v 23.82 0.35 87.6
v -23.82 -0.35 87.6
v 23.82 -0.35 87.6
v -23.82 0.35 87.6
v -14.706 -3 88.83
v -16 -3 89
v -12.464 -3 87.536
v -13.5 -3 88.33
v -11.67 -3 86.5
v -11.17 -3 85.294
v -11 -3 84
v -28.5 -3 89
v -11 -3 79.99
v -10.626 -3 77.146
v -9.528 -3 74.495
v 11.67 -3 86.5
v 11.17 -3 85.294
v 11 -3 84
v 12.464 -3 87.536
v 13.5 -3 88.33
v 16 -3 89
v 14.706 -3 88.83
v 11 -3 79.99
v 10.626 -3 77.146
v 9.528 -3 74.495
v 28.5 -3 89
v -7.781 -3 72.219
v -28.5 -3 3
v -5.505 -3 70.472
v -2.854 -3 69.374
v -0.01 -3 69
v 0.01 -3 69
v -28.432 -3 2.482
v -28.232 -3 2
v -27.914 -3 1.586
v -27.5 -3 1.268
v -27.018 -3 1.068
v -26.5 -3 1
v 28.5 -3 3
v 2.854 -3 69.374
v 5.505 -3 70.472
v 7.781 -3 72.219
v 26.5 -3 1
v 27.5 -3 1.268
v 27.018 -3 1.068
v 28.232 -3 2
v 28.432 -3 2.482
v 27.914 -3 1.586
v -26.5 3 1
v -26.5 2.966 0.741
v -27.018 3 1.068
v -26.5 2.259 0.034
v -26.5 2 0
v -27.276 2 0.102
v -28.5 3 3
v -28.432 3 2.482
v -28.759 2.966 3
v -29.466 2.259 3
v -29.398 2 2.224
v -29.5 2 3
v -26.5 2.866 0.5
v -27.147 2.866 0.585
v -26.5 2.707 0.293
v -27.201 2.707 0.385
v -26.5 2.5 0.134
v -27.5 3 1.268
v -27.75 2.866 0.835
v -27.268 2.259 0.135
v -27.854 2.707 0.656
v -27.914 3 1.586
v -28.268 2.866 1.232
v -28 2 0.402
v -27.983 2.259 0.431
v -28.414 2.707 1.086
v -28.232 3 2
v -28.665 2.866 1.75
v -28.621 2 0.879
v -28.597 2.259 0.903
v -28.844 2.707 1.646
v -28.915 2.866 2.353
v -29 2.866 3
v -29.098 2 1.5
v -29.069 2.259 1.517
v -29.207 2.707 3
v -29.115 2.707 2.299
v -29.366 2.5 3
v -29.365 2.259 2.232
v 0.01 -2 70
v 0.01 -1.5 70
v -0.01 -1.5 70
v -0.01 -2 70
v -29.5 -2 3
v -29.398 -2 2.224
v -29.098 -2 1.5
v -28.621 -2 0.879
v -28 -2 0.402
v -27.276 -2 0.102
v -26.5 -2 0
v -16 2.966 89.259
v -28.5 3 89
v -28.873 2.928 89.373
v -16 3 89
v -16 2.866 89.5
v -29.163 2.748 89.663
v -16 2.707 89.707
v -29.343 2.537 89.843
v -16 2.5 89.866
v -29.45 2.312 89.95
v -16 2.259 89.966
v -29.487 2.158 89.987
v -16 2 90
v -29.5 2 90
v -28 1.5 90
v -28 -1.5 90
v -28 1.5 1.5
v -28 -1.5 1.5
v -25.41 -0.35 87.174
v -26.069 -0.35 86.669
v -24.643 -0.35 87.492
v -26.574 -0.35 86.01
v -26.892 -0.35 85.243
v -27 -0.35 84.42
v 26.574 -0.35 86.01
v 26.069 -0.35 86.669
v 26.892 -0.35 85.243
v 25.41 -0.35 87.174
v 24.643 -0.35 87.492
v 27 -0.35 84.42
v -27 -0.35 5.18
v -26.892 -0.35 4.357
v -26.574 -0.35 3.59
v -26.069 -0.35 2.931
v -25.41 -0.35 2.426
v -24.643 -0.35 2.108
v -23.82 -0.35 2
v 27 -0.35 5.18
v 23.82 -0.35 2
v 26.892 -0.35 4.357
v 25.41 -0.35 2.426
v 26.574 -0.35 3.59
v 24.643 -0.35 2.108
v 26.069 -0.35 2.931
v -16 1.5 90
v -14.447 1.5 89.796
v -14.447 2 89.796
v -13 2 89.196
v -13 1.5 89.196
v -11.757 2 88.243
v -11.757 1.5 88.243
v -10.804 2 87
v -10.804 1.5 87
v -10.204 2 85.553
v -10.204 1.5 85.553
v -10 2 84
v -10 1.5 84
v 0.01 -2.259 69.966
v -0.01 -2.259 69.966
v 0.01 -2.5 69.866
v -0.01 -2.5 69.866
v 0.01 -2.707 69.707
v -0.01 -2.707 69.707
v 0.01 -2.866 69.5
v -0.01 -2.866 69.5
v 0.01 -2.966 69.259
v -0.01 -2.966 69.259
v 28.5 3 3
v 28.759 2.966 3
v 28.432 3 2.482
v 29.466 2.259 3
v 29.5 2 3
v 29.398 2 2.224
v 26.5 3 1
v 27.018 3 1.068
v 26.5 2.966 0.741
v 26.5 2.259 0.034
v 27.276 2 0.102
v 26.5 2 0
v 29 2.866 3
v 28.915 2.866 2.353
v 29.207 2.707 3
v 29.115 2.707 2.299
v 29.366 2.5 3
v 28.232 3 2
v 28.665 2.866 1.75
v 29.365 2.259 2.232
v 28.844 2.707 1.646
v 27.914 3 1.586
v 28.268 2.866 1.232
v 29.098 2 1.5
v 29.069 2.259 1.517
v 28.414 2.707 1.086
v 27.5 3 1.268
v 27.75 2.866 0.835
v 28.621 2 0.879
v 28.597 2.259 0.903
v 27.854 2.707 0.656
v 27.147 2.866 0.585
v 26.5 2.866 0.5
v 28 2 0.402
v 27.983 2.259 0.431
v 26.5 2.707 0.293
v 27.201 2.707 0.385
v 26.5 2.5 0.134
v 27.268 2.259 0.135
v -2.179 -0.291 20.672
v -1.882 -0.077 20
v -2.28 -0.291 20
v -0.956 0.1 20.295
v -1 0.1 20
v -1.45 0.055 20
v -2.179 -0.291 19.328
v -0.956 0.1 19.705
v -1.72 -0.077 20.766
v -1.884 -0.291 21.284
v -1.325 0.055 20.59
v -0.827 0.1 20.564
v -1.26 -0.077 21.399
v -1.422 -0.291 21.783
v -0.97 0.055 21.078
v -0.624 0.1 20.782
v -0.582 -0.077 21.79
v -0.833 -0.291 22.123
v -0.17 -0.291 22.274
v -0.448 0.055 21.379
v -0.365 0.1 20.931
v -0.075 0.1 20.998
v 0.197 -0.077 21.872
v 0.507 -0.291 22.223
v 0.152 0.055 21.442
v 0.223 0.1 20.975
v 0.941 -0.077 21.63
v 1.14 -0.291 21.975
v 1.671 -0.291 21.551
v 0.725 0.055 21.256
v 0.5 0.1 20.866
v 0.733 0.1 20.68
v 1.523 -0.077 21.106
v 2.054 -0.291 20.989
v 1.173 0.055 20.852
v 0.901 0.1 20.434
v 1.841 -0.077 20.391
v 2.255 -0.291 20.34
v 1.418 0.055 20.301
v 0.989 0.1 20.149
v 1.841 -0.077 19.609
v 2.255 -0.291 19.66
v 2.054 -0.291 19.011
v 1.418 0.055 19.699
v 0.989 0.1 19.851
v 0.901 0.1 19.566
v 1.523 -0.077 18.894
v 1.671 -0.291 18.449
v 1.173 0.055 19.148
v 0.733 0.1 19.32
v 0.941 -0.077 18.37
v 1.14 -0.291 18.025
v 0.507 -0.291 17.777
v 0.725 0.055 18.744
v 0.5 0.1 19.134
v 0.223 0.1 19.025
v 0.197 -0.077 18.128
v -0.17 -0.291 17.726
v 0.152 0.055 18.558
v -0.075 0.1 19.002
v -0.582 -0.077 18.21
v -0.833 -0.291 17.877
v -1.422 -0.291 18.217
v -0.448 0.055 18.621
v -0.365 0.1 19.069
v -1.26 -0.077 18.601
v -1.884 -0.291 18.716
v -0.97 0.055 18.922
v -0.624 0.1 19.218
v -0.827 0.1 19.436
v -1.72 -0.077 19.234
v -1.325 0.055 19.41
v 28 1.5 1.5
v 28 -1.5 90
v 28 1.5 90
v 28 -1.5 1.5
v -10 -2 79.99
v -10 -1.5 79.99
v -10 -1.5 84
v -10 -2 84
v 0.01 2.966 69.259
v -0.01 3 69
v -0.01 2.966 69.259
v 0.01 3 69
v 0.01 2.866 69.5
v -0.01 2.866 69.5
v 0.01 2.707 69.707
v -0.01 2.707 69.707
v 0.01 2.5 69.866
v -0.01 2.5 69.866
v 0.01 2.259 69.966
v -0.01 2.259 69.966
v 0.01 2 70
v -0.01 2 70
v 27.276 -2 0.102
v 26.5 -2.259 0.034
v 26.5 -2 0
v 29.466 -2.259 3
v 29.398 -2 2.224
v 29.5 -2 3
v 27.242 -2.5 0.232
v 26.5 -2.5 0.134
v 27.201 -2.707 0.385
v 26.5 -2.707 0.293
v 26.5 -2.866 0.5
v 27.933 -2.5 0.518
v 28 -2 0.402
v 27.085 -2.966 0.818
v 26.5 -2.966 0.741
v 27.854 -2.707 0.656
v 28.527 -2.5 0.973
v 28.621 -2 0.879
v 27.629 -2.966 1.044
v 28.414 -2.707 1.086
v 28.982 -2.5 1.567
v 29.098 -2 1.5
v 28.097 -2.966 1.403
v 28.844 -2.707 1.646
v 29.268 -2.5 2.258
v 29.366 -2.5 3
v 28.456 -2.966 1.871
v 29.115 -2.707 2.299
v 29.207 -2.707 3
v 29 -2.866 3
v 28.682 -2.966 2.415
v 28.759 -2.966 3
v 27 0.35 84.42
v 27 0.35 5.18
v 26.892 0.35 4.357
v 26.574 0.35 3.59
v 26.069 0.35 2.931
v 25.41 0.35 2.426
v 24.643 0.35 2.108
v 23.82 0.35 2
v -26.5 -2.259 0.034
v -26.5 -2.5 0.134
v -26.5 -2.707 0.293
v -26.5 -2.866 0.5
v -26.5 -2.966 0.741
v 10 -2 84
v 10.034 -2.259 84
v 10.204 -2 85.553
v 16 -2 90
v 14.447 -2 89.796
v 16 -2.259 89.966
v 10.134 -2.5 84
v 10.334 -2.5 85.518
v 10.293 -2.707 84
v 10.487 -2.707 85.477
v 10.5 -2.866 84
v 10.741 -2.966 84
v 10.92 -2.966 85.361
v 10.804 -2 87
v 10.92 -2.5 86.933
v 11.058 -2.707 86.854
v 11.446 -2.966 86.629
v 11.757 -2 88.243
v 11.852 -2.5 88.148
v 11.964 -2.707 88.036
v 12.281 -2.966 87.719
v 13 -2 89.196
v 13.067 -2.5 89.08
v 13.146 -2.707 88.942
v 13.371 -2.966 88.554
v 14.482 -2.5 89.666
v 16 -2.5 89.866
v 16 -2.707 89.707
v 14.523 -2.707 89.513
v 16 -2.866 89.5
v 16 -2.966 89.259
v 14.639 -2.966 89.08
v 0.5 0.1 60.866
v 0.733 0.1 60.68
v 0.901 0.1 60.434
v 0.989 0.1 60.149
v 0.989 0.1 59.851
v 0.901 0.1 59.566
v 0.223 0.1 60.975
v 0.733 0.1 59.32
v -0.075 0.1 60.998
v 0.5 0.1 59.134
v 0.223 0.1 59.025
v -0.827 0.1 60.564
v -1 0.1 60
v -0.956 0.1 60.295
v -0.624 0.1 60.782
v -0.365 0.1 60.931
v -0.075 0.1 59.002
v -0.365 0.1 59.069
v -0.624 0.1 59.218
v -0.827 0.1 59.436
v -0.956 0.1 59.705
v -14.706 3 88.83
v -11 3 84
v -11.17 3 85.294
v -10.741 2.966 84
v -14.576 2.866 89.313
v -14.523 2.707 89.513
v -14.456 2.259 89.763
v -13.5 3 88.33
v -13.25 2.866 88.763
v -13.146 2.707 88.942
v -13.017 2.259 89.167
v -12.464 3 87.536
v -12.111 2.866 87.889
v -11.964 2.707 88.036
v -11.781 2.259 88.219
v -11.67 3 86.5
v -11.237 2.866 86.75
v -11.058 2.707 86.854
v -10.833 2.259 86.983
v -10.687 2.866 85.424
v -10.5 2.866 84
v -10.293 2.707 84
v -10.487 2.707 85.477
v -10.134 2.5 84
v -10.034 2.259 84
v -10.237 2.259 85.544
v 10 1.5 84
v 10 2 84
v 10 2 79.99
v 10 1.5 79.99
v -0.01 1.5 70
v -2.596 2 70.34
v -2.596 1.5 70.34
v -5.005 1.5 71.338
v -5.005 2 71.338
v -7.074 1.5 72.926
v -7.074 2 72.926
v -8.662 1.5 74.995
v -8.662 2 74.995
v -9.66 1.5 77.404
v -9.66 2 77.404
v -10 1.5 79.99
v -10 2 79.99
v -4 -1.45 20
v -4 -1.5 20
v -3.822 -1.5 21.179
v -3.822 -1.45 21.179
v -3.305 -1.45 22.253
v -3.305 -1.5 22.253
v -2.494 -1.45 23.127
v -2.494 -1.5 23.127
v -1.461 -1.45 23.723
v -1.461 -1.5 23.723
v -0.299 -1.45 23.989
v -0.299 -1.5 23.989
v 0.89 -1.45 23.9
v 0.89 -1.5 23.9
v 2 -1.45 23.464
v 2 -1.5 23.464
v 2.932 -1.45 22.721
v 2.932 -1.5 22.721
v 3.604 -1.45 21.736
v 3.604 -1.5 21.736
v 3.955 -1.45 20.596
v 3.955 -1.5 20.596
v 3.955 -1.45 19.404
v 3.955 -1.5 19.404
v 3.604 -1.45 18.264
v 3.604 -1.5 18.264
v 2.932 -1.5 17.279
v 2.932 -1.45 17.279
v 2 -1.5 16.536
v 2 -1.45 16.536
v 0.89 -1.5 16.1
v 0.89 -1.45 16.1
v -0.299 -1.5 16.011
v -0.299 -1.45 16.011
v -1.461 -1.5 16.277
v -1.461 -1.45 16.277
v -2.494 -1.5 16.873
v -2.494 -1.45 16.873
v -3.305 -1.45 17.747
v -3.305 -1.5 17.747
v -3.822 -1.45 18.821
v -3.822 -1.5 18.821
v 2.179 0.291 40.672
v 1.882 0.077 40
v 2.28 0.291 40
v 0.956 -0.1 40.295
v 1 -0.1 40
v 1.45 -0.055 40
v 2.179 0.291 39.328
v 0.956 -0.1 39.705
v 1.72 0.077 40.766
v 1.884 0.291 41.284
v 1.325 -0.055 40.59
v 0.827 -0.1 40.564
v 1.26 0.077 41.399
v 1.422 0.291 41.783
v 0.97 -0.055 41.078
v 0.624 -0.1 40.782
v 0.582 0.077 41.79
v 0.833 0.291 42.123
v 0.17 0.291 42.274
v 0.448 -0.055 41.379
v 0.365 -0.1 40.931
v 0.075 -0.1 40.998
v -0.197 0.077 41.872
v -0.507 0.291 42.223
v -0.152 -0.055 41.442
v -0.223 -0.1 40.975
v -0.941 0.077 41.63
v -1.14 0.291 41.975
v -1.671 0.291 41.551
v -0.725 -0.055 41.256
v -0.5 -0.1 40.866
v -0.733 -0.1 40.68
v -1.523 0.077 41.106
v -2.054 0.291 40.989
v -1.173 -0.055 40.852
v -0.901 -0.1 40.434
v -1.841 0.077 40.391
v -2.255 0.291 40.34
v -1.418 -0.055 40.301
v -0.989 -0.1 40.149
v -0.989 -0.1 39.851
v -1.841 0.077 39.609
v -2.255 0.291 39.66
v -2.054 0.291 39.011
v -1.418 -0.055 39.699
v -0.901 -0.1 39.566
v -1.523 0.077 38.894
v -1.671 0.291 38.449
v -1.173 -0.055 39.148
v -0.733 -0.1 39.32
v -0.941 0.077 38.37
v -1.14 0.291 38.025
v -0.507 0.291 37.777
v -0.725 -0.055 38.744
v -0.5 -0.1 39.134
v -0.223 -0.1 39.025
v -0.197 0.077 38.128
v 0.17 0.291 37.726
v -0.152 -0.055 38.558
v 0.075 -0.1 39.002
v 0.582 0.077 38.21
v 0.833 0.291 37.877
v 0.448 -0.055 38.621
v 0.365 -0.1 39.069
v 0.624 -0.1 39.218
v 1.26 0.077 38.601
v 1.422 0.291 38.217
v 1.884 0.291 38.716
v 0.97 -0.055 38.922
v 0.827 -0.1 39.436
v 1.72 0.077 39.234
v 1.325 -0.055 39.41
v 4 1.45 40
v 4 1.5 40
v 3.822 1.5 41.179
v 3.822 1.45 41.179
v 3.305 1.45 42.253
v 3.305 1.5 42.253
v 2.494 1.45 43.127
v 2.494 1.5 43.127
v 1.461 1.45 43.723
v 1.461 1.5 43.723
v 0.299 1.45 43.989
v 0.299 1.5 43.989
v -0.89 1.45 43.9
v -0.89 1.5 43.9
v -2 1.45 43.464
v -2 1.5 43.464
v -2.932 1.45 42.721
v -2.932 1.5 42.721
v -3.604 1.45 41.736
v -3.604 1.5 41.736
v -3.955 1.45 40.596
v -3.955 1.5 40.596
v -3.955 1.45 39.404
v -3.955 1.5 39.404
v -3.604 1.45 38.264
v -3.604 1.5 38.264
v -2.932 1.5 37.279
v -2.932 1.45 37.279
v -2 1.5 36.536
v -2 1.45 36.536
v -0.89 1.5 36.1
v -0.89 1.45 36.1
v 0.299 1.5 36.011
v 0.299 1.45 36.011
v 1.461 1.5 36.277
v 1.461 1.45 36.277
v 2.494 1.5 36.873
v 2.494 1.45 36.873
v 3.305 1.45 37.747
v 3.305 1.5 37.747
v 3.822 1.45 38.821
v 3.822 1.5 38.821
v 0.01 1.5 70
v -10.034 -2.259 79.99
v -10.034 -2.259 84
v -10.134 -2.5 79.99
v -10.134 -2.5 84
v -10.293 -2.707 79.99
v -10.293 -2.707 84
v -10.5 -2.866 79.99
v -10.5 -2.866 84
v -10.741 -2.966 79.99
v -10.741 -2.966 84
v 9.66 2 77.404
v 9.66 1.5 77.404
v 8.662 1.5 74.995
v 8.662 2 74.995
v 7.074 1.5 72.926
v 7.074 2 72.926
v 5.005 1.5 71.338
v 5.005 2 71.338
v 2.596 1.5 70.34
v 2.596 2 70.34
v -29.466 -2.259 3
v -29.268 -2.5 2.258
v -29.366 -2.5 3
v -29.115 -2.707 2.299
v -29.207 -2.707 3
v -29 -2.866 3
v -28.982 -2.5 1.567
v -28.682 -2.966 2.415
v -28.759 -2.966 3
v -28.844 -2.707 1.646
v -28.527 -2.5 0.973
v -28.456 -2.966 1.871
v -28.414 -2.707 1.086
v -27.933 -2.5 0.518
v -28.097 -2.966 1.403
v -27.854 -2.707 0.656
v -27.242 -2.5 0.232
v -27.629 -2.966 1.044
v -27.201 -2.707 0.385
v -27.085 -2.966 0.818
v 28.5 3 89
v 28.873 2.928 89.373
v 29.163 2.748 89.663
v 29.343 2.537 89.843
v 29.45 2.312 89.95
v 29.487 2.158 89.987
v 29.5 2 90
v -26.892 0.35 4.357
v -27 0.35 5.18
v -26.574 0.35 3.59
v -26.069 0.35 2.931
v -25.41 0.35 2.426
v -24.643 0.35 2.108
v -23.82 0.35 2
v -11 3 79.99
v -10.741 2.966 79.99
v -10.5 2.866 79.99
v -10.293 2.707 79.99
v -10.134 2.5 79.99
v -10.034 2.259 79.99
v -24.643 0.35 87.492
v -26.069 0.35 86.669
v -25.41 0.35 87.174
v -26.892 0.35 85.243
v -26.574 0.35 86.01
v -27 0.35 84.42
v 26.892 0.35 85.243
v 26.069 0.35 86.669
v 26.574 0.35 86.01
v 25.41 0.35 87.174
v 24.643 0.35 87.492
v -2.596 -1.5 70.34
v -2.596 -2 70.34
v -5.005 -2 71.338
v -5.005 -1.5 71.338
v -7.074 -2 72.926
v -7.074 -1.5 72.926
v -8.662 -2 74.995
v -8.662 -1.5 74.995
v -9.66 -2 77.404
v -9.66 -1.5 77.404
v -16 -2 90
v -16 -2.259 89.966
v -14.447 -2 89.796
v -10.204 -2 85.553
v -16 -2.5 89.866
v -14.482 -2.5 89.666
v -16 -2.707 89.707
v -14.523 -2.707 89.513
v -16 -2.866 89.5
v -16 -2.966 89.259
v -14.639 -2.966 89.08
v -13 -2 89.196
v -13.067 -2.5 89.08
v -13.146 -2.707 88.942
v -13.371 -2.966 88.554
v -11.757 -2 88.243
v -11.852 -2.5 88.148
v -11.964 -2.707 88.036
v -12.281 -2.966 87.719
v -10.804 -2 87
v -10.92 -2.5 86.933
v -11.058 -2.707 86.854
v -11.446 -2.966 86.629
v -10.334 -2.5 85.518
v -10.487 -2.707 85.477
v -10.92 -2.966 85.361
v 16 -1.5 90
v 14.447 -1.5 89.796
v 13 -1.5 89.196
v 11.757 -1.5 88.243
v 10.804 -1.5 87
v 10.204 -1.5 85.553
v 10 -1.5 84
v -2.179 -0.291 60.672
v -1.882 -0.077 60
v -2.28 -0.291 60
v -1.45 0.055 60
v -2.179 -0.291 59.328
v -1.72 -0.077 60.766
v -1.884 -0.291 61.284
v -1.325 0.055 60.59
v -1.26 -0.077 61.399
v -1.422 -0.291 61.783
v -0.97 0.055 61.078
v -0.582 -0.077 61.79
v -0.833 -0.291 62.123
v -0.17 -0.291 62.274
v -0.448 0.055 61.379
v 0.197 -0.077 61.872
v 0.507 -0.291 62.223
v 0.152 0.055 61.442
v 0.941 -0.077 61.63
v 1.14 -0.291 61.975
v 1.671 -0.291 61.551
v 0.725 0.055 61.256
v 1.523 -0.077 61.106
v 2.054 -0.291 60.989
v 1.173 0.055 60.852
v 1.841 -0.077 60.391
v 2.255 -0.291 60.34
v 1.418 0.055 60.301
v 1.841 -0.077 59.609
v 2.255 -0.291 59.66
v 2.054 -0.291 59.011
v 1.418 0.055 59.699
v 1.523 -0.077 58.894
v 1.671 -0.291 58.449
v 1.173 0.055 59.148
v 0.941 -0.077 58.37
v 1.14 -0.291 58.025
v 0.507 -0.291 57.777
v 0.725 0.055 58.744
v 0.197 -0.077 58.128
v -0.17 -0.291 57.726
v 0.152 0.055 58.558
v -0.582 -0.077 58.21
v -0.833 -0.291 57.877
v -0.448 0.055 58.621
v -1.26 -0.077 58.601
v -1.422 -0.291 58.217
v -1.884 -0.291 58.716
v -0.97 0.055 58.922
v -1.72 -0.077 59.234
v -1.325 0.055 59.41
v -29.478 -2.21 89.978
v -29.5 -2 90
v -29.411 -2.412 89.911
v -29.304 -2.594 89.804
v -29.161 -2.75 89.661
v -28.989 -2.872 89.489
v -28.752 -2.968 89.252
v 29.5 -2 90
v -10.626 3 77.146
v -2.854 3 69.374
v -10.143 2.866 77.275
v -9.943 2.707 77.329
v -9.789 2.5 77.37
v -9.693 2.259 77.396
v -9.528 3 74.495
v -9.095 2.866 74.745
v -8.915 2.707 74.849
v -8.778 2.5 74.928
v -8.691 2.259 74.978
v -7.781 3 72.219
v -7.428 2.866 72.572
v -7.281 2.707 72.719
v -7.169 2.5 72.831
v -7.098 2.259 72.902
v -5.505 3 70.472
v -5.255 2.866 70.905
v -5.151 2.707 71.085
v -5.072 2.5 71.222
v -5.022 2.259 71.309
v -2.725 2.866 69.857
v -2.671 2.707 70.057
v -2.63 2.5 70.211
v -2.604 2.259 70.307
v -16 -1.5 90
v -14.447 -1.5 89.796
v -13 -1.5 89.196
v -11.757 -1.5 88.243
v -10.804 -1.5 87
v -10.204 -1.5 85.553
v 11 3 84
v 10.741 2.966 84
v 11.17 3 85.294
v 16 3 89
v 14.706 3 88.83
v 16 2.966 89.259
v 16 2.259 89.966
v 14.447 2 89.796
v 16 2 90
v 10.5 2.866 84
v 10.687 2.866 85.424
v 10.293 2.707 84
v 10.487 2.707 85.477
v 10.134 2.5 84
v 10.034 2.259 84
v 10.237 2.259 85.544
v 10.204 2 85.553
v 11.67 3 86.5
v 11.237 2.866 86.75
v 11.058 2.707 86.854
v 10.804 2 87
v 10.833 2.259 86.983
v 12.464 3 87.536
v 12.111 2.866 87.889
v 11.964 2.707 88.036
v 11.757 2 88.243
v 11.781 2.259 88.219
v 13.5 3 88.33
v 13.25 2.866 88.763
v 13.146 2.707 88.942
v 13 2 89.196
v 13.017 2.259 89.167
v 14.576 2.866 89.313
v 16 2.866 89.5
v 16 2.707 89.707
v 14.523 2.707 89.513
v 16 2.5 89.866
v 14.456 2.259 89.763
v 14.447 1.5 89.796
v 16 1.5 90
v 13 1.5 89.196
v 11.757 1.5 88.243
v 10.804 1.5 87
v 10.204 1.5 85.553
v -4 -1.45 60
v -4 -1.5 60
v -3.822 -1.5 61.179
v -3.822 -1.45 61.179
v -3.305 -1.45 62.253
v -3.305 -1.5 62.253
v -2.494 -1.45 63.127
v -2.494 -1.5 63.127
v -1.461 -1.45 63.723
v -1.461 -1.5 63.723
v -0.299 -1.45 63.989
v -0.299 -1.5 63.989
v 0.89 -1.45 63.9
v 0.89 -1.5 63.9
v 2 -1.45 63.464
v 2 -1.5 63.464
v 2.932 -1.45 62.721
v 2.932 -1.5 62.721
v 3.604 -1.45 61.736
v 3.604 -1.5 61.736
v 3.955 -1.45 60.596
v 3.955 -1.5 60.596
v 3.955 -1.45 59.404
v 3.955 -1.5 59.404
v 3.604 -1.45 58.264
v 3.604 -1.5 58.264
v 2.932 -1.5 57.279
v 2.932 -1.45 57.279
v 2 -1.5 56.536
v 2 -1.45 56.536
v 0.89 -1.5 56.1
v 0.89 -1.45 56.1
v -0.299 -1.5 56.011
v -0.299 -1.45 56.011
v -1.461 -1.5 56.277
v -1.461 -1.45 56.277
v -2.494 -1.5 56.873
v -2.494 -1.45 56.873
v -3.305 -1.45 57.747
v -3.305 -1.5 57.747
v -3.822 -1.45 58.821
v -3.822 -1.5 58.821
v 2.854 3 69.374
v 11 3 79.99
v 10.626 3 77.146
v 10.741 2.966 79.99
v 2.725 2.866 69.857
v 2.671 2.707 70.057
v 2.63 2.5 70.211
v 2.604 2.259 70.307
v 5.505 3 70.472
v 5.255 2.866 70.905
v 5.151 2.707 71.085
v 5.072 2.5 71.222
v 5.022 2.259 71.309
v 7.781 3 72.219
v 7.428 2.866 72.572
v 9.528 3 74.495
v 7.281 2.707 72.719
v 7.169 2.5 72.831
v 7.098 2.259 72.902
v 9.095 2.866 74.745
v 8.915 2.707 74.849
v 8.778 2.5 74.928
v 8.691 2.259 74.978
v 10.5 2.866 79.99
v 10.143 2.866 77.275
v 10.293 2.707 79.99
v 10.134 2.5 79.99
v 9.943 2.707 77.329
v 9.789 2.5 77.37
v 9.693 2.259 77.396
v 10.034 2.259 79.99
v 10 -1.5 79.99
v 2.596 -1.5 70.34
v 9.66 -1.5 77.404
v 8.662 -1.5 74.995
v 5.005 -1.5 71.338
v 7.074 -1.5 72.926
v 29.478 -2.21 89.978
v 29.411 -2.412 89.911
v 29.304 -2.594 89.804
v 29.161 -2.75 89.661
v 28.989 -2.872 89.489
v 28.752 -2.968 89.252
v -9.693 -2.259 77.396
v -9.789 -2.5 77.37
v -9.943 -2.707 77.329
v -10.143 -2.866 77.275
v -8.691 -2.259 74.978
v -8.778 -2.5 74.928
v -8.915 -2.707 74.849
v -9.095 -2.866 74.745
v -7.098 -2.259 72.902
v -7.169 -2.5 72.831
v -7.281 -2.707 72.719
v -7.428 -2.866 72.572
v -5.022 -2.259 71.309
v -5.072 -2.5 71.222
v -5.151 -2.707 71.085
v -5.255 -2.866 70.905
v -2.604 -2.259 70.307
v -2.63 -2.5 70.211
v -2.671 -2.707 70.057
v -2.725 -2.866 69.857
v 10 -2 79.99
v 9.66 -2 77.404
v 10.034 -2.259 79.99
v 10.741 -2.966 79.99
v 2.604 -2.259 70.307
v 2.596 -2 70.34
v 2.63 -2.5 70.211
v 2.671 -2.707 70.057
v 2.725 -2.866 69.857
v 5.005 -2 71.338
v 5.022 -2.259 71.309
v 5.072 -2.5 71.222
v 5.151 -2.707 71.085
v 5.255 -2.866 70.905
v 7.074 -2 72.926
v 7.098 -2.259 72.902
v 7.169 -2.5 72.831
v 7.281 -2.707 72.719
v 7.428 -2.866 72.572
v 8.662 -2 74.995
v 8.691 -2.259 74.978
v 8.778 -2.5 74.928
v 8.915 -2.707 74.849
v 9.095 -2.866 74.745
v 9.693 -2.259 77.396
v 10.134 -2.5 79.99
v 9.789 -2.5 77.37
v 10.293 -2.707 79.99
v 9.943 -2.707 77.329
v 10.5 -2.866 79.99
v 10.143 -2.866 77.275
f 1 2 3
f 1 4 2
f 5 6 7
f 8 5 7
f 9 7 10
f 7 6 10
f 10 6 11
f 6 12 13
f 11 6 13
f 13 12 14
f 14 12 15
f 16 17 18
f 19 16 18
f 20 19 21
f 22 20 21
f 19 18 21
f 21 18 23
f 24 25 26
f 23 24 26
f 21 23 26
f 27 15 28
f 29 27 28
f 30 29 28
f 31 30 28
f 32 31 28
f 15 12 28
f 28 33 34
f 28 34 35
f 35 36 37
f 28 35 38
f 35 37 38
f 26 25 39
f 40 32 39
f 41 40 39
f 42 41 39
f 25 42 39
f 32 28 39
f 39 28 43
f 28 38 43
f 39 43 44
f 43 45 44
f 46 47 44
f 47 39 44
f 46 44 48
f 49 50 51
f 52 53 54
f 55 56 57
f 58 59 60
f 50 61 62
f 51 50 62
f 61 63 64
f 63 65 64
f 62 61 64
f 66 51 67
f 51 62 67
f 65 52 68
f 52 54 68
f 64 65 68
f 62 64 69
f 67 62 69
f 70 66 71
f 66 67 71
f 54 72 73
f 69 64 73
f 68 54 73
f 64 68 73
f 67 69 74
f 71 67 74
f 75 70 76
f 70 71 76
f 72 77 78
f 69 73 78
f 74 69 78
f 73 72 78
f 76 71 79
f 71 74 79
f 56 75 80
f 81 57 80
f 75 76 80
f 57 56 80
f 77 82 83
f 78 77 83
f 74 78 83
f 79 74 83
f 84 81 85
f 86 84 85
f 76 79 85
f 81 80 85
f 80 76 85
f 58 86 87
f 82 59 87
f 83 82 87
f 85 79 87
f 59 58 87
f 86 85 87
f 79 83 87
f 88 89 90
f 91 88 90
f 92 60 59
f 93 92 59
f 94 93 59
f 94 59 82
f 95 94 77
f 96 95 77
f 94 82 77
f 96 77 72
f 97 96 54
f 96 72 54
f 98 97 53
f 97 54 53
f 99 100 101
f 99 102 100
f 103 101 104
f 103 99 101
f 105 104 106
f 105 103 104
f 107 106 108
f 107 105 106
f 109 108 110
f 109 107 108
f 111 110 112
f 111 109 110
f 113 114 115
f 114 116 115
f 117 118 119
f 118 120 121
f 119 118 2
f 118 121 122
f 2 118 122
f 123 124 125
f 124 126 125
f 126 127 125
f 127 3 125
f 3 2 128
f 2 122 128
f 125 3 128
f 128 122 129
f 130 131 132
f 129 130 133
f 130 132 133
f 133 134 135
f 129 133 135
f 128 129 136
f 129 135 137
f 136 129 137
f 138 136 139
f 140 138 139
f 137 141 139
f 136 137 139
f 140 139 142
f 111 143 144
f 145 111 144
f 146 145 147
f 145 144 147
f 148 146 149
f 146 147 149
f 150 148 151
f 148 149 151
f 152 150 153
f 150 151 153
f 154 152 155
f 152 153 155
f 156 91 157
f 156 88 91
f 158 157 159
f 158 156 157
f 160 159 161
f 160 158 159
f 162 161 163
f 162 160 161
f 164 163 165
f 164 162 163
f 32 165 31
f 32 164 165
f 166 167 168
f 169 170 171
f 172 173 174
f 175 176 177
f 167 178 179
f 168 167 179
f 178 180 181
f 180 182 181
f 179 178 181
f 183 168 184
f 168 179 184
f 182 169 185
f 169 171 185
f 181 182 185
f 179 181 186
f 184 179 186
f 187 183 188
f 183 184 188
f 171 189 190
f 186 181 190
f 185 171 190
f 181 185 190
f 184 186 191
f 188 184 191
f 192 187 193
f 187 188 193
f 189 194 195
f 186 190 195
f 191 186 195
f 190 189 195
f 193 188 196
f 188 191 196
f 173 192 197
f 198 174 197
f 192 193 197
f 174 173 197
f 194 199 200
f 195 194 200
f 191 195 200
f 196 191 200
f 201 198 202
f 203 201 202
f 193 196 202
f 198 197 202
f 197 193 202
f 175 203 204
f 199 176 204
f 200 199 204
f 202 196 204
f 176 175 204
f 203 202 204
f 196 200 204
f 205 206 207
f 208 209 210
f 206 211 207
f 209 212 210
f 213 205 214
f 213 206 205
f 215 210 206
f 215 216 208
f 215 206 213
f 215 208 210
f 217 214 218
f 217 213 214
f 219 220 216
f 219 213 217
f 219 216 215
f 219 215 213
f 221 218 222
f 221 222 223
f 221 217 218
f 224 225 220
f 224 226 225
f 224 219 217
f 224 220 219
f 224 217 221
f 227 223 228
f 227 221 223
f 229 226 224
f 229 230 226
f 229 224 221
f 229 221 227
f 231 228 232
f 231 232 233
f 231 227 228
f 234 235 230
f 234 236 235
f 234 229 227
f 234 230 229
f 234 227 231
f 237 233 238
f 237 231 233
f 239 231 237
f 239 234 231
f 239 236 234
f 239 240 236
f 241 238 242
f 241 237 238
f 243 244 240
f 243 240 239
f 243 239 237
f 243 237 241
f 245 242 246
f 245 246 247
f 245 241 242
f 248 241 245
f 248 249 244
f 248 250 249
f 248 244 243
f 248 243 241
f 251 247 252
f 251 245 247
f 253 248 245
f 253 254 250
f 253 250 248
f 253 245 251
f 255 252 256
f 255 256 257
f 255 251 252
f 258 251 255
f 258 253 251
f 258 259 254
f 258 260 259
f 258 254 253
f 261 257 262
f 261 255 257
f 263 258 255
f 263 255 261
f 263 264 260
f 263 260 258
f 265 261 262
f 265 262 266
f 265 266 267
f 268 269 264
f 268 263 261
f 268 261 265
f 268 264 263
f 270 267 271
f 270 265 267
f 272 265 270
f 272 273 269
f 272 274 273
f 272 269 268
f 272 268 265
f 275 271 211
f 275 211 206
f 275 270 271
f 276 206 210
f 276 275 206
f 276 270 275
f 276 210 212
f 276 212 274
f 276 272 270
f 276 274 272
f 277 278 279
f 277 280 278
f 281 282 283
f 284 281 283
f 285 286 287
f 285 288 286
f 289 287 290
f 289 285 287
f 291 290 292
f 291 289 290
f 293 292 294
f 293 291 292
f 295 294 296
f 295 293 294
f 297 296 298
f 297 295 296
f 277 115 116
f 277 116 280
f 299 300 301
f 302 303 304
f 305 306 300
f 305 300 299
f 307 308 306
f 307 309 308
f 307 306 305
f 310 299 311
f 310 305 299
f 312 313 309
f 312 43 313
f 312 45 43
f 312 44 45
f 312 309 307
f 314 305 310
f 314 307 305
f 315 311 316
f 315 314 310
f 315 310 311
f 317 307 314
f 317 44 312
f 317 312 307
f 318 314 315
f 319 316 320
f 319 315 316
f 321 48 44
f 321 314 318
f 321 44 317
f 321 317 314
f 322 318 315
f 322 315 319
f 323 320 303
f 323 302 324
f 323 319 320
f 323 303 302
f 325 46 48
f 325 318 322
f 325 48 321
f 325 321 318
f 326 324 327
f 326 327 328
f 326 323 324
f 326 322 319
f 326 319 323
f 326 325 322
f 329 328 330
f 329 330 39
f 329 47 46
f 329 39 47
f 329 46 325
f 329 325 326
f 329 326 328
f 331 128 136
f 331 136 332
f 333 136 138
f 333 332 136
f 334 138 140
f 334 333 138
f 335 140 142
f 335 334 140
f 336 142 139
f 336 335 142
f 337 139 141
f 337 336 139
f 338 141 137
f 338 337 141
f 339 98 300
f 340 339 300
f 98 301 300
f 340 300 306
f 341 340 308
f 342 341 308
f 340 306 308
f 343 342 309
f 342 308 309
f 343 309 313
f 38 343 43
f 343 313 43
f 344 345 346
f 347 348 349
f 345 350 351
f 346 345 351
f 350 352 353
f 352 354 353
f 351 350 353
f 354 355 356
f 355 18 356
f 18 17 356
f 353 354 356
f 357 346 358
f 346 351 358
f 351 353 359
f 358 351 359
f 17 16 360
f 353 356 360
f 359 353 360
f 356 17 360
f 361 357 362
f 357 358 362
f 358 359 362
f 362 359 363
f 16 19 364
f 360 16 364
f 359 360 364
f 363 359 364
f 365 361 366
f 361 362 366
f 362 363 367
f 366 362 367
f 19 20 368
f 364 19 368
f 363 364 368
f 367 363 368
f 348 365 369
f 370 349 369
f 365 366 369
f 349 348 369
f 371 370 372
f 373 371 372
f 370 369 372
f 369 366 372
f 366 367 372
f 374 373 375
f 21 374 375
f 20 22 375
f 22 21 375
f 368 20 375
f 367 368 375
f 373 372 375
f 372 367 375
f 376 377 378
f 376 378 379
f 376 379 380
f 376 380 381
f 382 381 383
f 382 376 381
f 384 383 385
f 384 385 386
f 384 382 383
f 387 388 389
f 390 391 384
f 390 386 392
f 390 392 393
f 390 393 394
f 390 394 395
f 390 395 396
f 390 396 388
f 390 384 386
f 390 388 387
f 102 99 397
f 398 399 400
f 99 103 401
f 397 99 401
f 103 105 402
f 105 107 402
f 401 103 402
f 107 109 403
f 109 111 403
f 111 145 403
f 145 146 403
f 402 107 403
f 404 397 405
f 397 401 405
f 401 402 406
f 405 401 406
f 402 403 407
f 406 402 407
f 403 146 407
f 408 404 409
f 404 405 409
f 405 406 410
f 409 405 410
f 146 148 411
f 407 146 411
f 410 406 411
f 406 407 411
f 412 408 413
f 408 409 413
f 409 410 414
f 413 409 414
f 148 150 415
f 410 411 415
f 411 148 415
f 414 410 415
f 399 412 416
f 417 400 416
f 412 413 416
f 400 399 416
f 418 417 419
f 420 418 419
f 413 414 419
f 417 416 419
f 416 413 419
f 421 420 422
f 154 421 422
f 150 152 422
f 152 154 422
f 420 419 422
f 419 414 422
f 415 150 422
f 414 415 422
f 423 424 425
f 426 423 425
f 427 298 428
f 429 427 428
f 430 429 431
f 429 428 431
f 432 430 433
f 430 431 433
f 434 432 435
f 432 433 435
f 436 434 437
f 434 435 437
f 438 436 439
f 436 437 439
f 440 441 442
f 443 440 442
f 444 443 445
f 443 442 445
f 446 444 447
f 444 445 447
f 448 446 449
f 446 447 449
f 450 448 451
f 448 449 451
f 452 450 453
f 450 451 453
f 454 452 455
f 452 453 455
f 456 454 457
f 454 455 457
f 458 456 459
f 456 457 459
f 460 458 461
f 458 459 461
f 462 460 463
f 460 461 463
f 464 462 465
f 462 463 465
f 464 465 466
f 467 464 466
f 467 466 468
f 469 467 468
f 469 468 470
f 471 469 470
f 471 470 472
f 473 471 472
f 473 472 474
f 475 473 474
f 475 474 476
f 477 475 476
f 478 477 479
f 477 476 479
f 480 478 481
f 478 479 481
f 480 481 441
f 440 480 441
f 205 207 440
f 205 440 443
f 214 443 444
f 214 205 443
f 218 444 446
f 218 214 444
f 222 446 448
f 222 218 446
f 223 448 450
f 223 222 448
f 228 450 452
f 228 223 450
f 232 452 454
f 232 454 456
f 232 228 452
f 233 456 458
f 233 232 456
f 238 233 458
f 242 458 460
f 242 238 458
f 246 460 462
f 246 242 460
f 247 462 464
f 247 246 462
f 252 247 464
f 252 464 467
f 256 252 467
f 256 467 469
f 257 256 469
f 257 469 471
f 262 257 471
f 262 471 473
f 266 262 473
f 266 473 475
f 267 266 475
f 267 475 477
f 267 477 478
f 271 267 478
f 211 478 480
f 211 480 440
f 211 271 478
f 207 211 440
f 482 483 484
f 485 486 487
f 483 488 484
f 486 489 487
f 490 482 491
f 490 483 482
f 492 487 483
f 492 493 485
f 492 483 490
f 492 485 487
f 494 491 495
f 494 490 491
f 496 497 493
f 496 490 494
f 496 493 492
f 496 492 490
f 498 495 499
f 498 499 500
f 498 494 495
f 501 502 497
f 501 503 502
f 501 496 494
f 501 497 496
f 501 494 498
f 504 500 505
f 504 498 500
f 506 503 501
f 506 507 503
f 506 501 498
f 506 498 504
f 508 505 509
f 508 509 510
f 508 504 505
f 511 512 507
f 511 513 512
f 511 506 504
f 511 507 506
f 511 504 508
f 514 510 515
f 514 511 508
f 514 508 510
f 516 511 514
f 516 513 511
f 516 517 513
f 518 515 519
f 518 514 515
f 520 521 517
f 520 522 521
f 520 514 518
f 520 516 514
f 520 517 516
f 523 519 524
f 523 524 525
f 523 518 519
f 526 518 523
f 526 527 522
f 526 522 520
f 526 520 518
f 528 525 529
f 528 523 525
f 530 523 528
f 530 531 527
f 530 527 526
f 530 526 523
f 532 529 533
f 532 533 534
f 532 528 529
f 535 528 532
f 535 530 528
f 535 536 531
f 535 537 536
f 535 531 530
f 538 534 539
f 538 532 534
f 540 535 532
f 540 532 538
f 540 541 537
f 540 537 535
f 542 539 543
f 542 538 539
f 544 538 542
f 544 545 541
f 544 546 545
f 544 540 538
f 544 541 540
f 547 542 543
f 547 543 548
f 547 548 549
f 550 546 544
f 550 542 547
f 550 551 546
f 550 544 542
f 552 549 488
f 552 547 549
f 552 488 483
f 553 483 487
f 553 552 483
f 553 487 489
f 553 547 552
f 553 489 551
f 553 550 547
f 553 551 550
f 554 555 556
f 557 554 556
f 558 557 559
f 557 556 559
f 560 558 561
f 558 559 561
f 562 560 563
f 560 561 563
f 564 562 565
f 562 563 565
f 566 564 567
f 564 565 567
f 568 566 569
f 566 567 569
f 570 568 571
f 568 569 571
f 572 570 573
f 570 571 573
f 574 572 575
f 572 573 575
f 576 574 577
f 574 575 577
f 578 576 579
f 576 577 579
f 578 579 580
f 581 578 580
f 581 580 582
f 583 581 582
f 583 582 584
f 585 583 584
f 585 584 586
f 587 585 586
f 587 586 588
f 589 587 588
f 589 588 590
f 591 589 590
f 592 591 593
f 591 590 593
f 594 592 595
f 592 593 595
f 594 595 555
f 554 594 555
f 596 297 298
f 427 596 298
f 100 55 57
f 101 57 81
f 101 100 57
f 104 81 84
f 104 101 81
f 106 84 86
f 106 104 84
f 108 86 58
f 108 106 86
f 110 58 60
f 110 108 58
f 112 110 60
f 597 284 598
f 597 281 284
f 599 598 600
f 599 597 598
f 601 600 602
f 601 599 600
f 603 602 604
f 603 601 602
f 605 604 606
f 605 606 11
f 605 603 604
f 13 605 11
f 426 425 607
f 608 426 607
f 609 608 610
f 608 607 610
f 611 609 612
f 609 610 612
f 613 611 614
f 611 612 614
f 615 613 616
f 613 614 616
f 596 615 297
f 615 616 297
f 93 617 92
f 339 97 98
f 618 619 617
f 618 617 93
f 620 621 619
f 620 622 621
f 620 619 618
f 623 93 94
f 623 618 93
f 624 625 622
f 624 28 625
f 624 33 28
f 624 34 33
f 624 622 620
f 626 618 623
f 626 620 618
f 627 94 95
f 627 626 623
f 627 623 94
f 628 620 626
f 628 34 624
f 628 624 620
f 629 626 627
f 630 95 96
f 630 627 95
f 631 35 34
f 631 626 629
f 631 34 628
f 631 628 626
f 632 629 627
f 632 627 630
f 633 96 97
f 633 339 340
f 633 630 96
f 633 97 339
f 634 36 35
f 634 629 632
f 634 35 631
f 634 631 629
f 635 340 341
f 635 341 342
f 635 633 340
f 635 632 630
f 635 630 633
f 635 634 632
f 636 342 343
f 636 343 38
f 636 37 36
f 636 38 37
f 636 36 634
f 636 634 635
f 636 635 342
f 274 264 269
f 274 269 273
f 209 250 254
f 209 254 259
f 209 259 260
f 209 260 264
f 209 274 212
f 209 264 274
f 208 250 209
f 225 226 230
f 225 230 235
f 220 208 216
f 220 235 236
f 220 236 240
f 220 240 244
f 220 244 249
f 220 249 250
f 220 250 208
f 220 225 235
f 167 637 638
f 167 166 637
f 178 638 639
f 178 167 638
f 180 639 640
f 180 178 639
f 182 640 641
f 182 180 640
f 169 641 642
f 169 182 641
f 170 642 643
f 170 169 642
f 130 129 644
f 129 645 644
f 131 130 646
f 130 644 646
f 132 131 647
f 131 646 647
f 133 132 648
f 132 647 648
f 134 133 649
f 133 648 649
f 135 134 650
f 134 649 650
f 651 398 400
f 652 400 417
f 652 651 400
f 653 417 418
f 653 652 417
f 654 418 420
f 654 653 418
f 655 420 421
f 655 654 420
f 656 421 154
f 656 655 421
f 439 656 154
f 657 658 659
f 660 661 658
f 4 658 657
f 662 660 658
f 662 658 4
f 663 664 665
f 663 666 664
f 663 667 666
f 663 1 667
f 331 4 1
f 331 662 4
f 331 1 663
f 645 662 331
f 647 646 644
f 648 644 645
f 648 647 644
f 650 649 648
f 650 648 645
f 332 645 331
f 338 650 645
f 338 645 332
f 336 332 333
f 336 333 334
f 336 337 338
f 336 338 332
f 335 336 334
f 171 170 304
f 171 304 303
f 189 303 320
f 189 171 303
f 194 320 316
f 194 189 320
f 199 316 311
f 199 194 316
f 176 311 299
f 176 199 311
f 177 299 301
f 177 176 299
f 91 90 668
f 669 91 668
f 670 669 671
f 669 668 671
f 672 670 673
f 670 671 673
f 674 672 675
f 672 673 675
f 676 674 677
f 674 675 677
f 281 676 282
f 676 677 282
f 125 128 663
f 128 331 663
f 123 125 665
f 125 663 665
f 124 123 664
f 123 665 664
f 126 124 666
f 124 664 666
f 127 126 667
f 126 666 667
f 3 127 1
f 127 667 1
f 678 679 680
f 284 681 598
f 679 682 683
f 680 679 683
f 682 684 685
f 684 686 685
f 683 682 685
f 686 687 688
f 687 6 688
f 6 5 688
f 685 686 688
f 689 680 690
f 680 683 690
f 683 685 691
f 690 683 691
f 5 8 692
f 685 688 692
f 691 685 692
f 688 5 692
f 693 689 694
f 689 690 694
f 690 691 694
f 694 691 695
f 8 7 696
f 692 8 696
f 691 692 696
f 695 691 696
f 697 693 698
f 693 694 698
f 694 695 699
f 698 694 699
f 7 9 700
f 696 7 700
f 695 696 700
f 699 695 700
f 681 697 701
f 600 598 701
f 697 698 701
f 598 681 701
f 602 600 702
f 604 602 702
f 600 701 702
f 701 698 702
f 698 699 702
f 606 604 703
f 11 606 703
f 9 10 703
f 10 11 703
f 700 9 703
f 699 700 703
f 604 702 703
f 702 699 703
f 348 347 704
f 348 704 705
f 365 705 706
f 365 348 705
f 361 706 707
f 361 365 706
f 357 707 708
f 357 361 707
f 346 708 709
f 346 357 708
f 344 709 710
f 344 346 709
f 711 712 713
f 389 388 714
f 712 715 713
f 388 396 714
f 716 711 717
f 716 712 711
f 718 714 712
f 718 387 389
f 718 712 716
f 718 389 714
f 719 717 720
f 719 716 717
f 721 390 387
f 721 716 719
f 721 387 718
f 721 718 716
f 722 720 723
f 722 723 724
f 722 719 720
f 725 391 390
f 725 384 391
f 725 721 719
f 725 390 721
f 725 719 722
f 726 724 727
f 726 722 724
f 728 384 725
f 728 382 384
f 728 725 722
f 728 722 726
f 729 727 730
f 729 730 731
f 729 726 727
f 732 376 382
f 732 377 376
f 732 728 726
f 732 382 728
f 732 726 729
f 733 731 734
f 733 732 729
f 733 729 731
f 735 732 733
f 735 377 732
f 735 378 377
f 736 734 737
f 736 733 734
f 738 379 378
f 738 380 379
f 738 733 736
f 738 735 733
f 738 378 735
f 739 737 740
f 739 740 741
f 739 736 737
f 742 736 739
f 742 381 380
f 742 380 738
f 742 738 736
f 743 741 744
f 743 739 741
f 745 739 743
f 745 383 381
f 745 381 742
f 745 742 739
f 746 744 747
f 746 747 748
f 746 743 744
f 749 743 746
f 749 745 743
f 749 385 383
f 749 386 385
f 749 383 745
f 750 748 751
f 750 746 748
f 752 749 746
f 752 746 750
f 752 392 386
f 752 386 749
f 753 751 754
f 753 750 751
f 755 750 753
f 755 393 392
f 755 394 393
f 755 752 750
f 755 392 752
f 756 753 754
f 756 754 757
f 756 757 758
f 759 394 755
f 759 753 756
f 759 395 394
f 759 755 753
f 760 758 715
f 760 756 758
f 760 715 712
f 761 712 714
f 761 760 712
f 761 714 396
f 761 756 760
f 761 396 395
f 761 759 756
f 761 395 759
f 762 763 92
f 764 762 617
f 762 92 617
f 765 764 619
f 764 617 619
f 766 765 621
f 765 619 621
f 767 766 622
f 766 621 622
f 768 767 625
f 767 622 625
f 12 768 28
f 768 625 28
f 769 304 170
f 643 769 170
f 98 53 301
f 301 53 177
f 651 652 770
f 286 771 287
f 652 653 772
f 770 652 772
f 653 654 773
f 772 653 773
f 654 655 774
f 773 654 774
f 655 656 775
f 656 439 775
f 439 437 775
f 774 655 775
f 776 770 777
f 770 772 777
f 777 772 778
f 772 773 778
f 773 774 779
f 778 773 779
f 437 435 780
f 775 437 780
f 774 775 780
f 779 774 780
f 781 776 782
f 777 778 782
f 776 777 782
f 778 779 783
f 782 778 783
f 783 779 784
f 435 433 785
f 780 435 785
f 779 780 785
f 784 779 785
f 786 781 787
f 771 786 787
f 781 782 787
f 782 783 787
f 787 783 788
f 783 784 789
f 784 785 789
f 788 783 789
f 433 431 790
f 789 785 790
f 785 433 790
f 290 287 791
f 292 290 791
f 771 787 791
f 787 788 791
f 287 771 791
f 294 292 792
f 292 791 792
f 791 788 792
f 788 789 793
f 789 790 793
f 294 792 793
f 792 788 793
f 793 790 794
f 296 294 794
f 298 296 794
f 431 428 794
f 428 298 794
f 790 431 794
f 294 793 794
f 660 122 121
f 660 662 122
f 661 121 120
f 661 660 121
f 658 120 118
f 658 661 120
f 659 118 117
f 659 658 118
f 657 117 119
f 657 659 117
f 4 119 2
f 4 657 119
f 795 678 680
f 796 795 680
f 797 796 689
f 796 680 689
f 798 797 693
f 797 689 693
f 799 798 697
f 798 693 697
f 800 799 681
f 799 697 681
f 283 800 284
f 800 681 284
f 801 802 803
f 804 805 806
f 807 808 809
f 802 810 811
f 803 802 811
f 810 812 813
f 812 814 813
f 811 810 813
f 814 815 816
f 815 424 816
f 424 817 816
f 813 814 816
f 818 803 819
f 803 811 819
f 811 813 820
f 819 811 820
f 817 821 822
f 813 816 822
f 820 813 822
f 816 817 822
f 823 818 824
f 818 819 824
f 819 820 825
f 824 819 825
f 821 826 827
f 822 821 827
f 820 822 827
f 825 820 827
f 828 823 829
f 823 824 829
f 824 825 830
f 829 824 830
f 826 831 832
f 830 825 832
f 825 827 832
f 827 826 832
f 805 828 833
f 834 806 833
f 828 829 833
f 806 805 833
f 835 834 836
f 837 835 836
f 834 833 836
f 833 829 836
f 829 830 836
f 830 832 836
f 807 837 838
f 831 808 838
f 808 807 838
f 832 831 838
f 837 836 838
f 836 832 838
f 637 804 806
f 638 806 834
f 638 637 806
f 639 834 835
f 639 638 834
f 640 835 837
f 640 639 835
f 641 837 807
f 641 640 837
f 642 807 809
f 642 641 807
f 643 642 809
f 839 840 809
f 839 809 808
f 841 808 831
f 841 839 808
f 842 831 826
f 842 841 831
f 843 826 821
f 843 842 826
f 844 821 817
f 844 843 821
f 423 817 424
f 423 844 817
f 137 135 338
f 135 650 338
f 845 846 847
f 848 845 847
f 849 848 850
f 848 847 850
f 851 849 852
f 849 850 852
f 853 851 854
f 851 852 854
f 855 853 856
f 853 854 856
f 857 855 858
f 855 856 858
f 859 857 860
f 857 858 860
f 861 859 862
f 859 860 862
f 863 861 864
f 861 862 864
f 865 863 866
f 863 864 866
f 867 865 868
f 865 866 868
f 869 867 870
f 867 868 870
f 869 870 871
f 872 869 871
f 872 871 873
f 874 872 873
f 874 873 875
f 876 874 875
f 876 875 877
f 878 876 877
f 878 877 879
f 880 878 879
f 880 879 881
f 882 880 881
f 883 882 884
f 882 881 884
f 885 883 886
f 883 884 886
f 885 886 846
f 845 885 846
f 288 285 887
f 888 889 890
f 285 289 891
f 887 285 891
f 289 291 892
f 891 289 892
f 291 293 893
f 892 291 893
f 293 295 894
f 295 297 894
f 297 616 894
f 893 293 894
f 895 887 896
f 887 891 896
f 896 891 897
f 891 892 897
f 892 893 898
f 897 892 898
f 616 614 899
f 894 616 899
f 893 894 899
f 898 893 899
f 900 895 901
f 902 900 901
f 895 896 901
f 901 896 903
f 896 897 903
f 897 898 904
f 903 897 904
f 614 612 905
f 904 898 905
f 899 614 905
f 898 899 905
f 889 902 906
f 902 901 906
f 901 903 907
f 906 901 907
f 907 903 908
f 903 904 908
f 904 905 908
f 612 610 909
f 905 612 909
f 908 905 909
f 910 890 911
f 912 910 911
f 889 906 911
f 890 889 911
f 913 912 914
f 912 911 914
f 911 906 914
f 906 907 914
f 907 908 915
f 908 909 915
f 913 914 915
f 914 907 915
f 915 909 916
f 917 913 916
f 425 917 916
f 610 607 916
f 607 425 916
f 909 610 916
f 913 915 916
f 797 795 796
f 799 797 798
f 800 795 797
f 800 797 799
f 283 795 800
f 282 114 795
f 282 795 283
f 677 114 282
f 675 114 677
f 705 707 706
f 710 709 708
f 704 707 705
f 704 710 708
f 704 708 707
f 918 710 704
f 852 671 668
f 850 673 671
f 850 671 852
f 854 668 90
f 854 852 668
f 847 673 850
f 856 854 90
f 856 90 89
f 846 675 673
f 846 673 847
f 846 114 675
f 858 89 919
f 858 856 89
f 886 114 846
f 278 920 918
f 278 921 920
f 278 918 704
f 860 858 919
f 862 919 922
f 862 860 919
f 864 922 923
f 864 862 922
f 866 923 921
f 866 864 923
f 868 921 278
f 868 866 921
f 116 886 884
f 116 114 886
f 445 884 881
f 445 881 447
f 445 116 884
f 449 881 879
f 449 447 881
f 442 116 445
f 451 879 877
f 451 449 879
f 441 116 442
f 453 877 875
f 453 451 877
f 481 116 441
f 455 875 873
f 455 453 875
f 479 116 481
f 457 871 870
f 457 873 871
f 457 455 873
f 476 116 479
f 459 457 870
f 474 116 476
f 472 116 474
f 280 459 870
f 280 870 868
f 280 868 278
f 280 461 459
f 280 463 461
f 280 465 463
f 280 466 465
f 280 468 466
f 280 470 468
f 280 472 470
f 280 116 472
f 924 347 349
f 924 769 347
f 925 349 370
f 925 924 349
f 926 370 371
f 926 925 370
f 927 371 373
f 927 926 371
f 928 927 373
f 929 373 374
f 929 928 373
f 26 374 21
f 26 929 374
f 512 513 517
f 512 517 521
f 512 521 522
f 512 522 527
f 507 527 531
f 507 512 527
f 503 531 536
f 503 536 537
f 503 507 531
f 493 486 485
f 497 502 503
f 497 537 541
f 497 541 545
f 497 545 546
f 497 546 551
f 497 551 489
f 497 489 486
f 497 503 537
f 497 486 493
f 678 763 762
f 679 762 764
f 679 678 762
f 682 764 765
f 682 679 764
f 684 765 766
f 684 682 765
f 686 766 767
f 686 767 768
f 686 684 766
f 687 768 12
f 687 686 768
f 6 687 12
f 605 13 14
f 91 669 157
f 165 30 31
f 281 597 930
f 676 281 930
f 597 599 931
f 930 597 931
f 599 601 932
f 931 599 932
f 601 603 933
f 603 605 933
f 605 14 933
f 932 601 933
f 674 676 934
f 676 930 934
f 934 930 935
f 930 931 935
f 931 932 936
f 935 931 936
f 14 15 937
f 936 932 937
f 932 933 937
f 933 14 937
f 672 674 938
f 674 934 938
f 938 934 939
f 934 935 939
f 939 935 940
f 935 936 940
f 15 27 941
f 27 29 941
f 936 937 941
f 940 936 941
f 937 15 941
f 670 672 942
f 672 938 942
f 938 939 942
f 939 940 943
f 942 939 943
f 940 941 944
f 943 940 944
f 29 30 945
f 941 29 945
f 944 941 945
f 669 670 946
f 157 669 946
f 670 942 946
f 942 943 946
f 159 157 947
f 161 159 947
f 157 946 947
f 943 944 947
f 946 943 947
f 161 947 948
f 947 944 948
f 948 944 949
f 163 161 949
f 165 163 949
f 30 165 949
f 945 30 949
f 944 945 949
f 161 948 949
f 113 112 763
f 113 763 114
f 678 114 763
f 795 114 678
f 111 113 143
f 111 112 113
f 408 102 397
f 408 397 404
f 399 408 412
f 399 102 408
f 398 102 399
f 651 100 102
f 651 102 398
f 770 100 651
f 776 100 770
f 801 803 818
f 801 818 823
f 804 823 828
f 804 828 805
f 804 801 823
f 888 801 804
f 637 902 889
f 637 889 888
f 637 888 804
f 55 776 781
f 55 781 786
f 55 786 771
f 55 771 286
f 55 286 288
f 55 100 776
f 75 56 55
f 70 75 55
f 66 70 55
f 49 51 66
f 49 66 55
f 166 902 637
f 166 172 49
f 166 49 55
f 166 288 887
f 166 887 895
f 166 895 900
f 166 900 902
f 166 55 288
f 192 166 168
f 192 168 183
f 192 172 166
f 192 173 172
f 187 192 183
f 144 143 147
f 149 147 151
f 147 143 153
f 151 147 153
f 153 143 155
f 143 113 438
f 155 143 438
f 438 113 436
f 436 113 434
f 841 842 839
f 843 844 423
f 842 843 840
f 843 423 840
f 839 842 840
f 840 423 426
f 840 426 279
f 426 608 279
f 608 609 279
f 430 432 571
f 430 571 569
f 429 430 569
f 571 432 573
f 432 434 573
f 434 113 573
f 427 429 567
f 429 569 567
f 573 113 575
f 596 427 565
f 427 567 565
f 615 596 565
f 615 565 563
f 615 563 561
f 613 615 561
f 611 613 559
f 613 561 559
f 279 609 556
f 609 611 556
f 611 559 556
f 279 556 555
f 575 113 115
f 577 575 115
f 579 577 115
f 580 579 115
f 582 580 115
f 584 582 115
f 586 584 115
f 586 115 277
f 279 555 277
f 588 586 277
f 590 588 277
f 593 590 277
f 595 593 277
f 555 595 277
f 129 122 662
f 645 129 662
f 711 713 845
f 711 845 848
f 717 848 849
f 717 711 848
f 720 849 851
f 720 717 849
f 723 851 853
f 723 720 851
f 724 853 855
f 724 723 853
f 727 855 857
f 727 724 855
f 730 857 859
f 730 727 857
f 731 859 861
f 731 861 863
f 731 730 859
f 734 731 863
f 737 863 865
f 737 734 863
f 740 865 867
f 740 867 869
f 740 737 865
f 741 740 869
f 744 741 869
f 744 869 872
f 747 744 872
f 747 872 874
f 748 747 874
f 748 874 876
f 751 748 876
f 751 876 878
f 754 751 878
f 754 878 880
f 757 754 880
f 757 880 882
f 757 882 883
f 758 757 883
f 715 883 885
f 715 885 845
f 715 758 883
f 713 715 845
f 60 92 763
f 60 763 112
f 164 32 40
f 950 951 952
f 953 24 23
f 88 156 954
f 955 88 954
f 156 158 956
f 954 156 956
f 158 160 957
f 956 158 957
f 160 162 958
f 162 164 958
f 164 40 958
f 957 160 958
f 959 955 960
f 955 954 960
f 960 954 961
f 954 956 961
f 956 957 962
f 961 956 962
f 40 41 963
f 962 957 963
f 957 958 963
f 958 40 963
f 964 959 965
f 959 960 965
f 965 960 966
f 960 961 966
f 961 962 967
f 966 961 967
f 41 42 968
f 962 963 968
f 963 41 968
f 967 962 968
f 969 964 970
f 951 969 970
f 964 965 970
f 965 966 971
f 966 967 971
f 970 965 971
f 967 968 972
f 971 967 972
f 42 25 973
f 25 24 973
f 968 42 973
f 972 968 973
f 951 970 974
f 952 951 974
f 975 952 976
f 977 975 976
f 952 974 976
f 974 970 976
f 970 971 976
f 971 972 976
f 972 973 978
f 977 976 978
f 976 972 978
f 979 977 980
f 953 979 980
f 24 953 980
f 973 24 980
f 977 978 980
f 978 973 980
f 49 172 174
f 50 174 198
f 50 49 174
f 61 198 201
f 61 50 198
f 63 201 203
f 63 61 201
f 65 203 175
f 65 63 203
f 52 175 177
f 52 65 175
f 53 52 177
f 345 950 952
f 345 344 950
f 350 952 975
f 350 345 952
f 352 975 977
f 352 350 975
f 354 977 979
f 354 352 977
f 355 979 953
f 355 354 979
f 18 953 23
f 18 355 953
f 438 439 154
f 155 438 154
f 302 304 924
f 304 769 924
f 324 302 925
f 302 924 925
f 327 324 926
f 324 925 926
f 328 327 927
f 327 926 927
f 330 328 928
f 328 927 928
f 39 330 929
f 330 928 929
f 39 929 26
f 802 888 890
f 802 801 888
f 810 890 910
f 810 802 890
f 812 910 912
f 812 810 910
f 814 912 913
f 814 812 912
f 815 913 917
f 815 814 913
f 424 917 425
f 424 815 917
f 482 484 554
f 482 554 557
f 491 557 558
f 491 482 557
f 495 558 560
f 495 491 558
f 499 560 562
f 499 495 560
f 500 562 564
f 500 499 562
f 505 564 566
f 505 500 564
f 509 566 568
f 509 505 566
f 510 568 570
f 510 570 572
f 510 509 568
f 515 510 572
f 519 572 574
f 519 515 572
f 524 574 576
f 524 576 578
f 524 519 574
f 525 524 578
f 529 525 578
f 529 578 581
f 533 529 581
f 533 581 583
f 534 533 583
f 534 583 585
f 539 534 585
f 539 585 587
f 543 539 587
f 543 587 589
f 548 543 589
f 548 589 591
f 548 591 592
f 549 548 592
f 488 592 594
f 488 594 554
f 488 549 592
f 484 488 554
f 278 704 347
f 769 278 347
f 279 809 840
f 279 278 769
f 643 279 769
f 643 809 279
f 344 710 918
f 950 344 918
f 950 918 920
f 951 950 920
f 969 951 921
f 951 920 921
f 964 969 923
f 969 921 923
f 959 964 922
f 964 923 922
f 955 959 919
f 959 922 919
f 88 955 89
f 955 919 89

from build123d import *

# Parameters (mm, degrees)
SKETCH_W        = 54
SKETCH_H        = 0.7
PAD_DEPTH       = 85.6
FILLET_R        = 3.18
SKETCH001_W     = 59
SKETCH001_H     = 6
PAD001_DEPTH    = 90
THICKNESS_T     = -1.5
POCKET_DEPTH    = 6.001
SKETCH003_R     = 4
PAD002_DEPTH    = 1.6
SKETCH004_R     = 4
PAD003_DEPTH    = 1.6
CHAMFER_1_SIZE2 = 2.3
CHAMFER_1_SIZE  = 1.55
CHAMFER_2_SIZE2 = 2.3
CHAMFER_2_SIZE  = 1.55
CHAMFER_3_SIZE2 = 2.3
CHAMFER_3_SIZE  = 1.55
FILLET001_R     = 2.29
FILLET002_R     = 6
FILLET003_R     = 3
FILLET004_R     = 1
FILLET005_R     = 1


with BuildPart() as card:
    # Sketch → Pad (new body)
    with BuildSketch(Plane.XY.offset(2)):
        Rectangle(SKETCH_W, SKETCH_H)
    extrude(amount=PAD_DEPTH)

    # Fillet
    fillet_edges = [card.edges().sort_by_distance(p)[0] for p in [
        (-27, 0, 2),
        (-27, 0, 87.6),
        (27, 0, 87.6),
        (27, 0, 2),
    ]]
    fillet(fillet_edges, radius=FILLET_R)


with BuildPart() as wallet:
    # Sketch001 → Pad001 (new body)
    with BuildSketch(Plane.XY):
        Rectangle(SKETCH001_W, SKETCH001_H)
    extrude(amount=PAD001_DEPTH)

    # Thickness
    thickness_openings = [wallet.faces().sort_by_distance(p)[0] for p in [
        (0, 0, 90),
    ]]
    offset(amount=THICKNESS_T, openings=thickness_openings)

    # Sketch002 (on Face2 of Pad001) → Pocket (cut, through all)
    with BuildSketch(Plane(origin=(0, 3, 0), x_dir=(-1, 0, 0), z_dir=(0, 1, 0))):
        with BuildLine():
            Line((-0.01, 70), (0.01, 70))
            ThreePointArc((0.01, 70), (7.073997, 72.926003), (10, 79.99))
            Line((10, 79.99), (10, 90))
            Line((10, 90), (-10, 90))
            Line((-10, 90), (-10, 79.99))
            ThreePointArc((-10, 79.99), (-7.073997, 72.926003), (-0.01, 70))
        make_face()
    extrude(amount=-POCKET_DEPTH, mode=Mode.SUBTRACT)

    # Sketch003 (on Face18 of Pocket) → Pad002 (join)
    with BuildSketch(Plane(origin=(0, -1.5, 0), x_dir=(-1, 0, 0), z_dir=(0, 1, 0))):
        with Locations((0, 60)):
            Circle(SKETCH003_R)
        with Locations((0, 20)):
            Circle(SKETCH003_R)
    extrude(amount=PAD002_DEPTH)

    # Sketch004 (on Face20 of Pad002) → Pad003 (join)
    with BuildSketch(Plane.XZ.offset(-1.5)):
        with Locations((0, 40)):
            Circle(SKETCH004_R)
    extrude(amount=PAD003_DEPTH)

    # Chamfer 1
    chamfer_1_edges = [wallet.edges().sort_by_distance(p)[0] for p in [
        (4, 0.1, 60),
    ]]
    chamfer_1_side = wallet.faces().sort_by_distance((4, -0.7, 60))[0]
    chamfer(chamfer_1_edges, length=CHAMFER_1_SIZE, length2=CHAMFER_1_SIZE2, reference=chamfer_1_side)

    # Chamfer 2
    chamfer_2_edges = [wallet.edges().sort_by_distance(p)[0] for p in [
        (-4, -0.1, 40),
    ]]
    chamfer_2_side = wallet.faces().sort_by_distance((-4, 0.7, 40))[0]
    chamfer(chamfer_2_edges, length=CHAMFER_2_SIZE, length2=CHAMFER_2_SIZE2, reference=chamfer_2_side)

    # Chamfer 3
    chamfer_3_edges = [wallet.edges().sort_by_distance(p)[0] for p in [
        (4, 0.1, 20),
    ]]
    chamfer_3_side = wallet.faces().sort_by_distance((4, -0.7, 20))[0]
    chamfer(chamfer_3_edges, length=CHAMFER_3_SIZE, length2=CHAMFER_3_SIZE2, reference=chamfer_3_side)

    # Fillet001
    fillet001_edges = [wallet.edges().sort_by_distance(p)[0] for p in [
        (1.7, 0.1, 60),
        (-1.7, -0.1, 40),
        (1.7, 0.1, 20),
    ]]
    fillet(fillet001_edges, radius=FILLET001_R)

    # Fillet002
    fillet002_edges = [wallet.edges().sort_by_distance(p)[0] for p in [
        (-10, 2.25, 90),
        (-10, -2.25, 90),
        (10, 2.25, 90),
        (10, -2.25, 90),
    ]]
    fillet(fillet002_edges, radius=FILLET002_R)

    # Fillet003
    fillet003_edges = [wallet.edges().sort_by_distance(p)[0] for p in [
        (-29.5, 0, 0),
        (29.5, 0, 0),
    ]]
    fillet(fillet003_edges, radius=FILLET003_R)

    # Fillet004
    fillet004_edges = [wallet.edges().sort_by_distance(p)[0] for p in [
        (-29.5, 3, 46.5),
        (-28.62132, 3, 0.87868),
        (-22.75, 3, 90),
        (0, 3, 0),
        (-11.757359, 3, 88.242641),
        (28.62132, 3, 0.87868),
        (-10, 3, 81.995),
        (29.5, 3, 46.5),
        (-7.073997, 3, 72.926003),
        (22.75, 3, 90),
        (0, 3, 70),
        (11.757359, 3, 88.242641),
        (7.073997, 3, 72.926003),
        (10, 3, 81.995),
    ]]
    fillet(fillet004_edges, radius=FILLET004_R)

    # Fillet005
    fillet005_edges = [wallet.edges().sort_by_distance(p)[0] for p in [
        (29.5, -3, 46.5),
        (28.62132, -3, 0.87868),
        (22.75, -3, 90),
        (0, -3, 0),
        (11.757359, -3, 88.242641),
        (-28.62132, -3, 0.87868),
        (10, -3, 81.995),
        (-29.5, -3, 46.5),
        (7.073997, -3, 72.926003),
        (-22.75, -3, 90),
        (0, -3, 70),
        (-11.757359, -3, 88.242641),
        (-7.073997, -3, 72.926003),
        (-10, -3, 81.995),
    ]]
    fillet(fillet005_edges, radius=FILLET005_R)


solid = Compound([card.part, wallet.part])
